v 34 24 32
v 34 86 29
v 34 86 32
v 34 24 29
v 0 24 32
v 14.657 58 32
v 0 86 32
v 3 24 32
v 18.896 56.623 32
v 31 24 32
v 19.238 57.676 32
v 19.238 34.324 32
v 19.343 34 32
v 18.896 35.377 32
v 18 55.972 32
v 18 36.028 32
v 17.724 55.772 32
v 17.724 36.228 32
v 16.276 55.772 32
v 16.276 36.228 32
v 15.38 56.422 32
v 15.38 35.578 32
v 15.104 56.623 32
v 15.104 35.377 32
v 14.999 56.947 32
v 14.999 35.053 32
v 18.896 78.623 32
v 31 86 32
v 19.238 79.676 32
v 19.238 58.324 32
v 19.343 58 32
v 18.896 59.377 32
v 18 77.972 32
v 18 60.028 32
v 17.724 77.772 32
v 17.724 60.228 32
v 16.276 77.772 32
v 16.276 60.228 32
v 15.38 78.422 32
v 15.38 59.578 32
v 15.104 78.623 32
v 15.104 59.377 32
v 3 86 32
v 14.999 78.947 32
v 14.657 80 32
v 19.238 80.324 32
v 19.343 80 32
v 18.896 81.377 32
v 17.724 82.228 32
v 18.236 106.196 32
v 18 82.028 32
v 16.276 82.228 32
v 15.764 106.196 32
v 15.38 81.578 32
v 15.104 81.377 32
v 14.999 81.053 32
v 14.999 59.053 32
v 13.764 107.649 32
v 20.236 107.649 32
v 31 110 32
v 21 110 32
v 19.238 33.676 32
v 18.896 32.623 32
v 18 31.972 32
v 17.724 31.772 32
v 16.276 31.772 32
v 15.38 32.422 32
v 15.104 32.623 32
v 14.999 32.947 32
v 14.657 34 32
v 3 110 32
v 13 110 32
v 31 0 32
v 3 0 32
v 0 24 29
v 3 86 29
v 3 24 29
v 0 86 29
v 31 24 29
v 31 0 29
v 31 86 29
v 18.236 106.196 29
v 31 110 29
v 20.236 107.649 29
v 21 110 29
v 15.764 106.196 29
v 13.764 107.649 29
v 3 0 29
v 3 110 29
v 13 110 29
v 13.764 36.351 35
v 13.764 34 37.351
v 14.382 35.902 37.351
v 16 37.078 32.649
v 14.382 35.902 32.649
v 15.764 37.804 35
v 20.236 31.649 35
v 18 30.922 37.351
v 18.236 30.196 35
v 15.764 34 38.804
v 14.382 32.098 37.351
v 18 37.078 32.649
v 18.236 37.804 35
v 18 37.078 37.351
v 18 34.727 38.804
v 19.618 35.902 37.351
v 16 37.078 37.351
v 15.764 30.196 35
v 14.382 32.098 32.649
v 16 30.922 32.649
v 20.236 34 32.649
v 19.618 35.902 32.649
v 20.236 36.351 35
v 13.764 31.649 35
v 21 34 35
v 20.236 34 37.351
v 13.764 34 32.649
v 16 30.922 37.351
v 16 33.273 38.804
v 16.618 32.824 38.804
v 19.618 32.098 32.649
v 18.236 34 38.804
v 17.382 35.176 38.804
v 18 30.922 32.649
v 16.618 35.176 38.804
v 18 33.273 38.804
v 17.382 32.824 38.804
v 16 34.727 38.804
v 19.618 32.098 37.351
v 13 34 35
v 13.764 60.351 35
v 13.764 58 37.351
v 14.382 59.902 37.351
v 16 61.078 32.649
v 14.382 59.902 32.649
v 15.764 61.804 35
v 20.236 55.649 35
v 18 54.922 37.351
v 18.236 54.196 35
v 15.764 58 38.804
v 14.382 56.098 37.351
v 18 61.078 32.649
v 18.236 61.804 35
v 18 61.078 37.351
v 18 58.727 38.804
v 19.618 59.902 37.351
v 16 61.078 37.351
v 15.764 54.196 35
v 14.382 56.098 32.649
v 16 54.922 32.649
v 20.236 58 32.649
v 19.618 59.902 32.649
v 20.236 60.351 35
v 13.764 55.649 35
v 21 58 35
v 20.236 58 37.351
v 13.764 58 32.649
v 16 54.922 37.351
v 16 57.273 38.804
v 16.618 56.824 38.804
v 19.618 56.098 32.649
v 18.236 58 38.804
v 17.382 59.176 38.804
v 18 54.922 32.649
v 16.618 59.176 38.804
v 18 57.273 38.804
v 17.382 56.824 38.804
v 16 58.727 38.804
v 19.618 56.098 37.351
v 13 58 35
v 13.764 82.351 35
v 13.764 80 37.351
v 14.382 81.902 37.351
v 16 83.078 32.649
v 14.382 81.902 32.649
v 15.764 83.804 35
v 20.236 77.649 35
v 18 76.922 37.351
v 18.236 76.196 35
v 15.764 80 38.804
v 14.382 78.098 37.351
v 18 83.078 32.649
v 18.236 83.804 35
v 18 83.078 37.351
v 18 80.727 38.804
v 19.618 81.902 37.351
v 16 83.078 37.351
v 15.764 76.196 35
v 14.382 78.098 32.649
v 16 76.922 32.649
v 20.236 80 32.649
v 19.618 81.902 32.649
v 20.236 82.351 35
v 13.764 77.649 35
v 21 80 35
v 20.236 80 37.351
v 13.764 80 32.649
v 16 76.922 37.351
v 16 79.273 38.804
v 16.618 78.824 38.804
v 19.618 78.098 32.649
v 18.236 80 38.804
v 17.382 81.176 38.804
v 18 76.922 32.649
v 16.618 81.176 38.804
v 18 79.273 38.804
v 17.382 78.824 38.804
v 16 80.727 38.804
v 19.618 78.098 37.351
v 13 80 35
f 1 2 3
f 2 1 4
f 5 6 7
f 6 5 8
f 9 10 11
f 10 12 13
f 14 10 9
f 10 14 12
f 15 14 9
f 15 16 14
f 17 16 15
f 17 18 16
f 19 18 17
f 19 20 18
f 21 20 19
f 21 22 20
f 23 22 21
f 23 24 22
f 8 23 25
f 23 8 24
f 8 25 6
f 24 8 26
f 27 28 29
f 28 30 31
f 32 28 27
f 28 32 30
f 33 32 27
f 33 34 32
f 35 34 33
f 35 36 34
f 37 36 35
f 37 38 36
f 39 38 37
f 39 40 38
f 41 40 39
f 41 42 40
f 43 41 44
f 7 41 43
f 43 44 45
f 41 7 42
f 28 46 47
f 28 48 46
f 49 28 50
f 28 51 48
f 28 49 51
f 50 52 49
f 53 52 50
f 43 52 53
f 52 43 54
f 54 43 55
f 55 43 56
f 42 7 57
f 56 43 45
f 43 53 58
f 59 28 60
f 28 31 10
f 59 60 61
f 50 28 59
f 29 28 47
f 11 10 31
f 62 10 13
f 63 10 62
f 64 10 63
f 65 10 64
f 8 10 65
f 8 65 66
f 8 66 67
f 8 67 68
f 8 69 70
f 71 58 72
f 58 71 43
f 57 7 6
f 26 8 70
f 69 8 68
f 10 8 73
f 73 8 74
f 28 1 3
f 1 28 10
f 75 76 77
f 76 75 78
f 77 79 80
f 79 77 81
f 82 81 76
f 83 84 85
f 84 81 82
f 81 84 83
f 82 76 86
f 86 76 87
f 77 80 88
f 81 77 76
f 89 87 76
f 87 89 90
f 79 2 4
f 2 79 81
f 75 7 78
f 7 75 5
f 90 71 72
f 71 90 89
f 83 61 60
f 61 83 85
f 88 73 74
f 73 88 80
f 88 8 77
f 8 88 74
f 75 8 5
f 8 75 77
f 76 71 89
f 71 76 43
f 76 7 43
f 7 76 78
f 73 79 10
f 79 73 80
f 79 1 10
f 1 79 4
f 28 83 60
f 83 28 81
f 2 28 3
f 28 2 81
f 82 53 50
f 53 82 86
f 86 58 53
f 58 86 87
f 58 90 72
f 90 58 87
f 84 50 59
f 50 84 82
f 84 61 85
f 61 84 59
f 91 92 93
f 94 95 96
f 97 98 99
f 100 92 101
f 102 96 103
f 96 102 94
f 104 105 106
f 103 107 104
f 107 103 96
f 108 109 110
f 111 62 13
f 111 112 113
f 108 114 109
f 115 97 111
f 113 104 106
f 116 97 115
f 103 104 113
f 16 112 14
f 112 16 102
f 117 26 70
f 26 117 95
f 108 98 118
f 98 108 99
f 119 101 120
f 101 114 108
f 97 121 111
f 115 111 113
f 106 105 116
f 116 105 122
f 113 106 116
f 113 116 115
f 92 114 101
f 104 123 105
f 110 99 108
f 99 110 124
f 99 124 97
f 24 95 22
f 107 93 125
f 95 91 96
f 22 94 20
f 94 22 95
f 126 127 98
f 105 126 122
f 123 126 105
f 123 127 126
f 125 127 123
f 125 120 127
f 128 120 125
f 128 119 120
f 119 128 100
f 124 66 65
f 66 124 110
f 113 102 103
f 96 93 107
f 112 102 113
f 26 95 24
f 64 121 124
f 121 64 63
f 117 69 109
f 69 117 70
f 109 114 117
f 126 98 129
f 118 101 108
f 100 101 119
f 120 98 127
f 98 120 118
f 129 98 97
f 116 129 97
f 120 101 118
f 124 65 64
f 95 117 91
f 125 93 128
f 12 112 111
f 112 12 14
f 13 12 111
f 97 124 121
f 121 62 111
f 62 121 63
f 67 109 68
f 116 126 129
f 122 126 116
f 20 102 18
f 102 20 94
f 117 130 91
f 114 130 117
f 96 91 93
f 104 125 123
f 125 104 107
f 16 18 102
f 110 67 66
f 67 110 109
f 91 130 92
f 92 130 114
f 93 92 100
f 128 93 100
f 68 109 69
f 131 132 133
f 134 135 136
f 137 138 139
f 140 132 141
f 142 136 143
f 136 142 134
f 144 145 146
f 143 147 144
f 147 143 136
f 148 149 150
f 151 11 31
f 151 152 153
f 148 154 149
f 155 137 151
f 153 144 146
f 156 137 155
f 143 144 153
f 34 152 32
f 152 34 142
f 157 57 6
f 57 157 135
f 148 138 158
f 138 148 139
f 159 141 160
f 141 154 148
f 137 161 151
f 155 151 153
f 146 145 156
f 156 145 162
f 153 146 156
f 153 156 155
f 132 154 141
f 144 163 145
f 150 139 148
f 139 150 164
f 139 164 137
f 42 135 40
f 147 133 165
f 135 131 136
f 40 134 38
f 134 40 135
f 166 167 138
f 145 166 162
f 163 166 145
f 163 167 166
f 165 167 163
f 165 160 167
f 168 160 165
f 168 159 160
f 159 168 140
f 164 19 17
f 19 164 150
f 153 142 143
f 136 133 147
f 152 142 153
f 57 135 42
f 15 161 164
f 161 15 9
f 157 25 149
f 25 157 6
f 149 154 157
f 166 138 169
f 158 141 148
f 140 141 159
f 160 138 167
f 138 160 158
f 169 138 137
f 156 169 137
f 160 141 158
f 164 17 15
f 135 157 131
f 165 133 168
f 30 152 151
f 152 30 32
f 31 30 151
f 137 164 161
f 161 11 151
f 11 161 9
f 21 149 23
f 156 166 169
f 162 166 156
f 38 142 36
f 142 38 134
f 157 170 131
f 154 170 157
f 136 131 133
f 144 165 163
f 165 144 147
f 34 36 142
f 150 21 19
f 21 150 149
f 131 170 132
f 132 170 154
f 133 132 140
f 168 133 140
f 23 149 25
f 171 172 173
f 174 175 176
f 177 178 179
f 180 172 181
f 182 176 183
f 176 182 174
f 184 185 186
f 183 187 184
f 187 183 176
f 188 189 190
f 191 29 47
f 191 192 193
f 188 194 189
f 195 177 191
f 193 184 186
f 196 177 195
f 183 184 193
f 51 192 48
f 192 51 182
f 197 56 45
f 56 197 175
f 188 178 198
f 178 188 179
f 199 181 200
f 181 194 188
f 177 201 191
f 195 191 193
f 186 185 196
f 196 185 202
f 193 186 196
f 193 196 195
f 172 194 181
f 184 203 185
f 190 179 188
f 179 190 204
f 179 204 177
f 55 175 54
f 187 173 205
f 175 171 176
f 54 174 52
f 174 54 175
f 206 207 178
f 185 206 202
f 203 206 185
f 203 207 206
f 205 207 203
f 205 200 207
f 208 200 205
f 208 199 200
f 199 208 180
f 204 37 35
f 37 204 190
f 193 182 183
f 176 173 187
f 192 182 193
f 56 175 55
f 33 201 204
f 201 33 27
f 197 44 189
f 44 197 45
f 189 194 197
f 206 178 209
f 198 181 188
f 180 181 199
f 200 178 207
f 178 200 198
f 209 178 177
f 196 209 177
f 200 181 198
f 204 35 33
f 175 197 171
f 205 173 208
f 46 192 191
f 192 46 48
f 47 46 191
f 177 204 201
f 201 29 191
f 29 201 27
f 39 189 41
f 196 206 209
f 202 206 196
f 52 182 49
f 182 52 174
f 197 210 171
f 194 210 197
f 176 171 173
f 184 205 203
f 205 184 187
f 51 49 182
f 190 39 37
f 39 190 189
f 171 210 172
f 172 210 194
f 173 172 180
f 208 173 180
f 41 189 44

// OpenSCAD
$fn=10;   // For persion of polygons


union(){
difference(){
translate([0,0,29]){
cube([34,110,3]);  //upper plate.
}
translate([-1,-1,28]){
cube([4,25,6]);
}
translate([-1,86,28]){
cube([4,25,6]);
}
translate([31,-1,28]){
cube([4,25,6]);
}
translate([31,86,28]){
cube([4,25,6]);
}
translate([17,110,26]){
    cylinder(r=4,h=10);
}}
translate([17,34,35]){
    sphere(4);
}
translate([17,58,35]){
    sphere(4);
}
translate([17,80,35]){
    sphere(4);
}}
